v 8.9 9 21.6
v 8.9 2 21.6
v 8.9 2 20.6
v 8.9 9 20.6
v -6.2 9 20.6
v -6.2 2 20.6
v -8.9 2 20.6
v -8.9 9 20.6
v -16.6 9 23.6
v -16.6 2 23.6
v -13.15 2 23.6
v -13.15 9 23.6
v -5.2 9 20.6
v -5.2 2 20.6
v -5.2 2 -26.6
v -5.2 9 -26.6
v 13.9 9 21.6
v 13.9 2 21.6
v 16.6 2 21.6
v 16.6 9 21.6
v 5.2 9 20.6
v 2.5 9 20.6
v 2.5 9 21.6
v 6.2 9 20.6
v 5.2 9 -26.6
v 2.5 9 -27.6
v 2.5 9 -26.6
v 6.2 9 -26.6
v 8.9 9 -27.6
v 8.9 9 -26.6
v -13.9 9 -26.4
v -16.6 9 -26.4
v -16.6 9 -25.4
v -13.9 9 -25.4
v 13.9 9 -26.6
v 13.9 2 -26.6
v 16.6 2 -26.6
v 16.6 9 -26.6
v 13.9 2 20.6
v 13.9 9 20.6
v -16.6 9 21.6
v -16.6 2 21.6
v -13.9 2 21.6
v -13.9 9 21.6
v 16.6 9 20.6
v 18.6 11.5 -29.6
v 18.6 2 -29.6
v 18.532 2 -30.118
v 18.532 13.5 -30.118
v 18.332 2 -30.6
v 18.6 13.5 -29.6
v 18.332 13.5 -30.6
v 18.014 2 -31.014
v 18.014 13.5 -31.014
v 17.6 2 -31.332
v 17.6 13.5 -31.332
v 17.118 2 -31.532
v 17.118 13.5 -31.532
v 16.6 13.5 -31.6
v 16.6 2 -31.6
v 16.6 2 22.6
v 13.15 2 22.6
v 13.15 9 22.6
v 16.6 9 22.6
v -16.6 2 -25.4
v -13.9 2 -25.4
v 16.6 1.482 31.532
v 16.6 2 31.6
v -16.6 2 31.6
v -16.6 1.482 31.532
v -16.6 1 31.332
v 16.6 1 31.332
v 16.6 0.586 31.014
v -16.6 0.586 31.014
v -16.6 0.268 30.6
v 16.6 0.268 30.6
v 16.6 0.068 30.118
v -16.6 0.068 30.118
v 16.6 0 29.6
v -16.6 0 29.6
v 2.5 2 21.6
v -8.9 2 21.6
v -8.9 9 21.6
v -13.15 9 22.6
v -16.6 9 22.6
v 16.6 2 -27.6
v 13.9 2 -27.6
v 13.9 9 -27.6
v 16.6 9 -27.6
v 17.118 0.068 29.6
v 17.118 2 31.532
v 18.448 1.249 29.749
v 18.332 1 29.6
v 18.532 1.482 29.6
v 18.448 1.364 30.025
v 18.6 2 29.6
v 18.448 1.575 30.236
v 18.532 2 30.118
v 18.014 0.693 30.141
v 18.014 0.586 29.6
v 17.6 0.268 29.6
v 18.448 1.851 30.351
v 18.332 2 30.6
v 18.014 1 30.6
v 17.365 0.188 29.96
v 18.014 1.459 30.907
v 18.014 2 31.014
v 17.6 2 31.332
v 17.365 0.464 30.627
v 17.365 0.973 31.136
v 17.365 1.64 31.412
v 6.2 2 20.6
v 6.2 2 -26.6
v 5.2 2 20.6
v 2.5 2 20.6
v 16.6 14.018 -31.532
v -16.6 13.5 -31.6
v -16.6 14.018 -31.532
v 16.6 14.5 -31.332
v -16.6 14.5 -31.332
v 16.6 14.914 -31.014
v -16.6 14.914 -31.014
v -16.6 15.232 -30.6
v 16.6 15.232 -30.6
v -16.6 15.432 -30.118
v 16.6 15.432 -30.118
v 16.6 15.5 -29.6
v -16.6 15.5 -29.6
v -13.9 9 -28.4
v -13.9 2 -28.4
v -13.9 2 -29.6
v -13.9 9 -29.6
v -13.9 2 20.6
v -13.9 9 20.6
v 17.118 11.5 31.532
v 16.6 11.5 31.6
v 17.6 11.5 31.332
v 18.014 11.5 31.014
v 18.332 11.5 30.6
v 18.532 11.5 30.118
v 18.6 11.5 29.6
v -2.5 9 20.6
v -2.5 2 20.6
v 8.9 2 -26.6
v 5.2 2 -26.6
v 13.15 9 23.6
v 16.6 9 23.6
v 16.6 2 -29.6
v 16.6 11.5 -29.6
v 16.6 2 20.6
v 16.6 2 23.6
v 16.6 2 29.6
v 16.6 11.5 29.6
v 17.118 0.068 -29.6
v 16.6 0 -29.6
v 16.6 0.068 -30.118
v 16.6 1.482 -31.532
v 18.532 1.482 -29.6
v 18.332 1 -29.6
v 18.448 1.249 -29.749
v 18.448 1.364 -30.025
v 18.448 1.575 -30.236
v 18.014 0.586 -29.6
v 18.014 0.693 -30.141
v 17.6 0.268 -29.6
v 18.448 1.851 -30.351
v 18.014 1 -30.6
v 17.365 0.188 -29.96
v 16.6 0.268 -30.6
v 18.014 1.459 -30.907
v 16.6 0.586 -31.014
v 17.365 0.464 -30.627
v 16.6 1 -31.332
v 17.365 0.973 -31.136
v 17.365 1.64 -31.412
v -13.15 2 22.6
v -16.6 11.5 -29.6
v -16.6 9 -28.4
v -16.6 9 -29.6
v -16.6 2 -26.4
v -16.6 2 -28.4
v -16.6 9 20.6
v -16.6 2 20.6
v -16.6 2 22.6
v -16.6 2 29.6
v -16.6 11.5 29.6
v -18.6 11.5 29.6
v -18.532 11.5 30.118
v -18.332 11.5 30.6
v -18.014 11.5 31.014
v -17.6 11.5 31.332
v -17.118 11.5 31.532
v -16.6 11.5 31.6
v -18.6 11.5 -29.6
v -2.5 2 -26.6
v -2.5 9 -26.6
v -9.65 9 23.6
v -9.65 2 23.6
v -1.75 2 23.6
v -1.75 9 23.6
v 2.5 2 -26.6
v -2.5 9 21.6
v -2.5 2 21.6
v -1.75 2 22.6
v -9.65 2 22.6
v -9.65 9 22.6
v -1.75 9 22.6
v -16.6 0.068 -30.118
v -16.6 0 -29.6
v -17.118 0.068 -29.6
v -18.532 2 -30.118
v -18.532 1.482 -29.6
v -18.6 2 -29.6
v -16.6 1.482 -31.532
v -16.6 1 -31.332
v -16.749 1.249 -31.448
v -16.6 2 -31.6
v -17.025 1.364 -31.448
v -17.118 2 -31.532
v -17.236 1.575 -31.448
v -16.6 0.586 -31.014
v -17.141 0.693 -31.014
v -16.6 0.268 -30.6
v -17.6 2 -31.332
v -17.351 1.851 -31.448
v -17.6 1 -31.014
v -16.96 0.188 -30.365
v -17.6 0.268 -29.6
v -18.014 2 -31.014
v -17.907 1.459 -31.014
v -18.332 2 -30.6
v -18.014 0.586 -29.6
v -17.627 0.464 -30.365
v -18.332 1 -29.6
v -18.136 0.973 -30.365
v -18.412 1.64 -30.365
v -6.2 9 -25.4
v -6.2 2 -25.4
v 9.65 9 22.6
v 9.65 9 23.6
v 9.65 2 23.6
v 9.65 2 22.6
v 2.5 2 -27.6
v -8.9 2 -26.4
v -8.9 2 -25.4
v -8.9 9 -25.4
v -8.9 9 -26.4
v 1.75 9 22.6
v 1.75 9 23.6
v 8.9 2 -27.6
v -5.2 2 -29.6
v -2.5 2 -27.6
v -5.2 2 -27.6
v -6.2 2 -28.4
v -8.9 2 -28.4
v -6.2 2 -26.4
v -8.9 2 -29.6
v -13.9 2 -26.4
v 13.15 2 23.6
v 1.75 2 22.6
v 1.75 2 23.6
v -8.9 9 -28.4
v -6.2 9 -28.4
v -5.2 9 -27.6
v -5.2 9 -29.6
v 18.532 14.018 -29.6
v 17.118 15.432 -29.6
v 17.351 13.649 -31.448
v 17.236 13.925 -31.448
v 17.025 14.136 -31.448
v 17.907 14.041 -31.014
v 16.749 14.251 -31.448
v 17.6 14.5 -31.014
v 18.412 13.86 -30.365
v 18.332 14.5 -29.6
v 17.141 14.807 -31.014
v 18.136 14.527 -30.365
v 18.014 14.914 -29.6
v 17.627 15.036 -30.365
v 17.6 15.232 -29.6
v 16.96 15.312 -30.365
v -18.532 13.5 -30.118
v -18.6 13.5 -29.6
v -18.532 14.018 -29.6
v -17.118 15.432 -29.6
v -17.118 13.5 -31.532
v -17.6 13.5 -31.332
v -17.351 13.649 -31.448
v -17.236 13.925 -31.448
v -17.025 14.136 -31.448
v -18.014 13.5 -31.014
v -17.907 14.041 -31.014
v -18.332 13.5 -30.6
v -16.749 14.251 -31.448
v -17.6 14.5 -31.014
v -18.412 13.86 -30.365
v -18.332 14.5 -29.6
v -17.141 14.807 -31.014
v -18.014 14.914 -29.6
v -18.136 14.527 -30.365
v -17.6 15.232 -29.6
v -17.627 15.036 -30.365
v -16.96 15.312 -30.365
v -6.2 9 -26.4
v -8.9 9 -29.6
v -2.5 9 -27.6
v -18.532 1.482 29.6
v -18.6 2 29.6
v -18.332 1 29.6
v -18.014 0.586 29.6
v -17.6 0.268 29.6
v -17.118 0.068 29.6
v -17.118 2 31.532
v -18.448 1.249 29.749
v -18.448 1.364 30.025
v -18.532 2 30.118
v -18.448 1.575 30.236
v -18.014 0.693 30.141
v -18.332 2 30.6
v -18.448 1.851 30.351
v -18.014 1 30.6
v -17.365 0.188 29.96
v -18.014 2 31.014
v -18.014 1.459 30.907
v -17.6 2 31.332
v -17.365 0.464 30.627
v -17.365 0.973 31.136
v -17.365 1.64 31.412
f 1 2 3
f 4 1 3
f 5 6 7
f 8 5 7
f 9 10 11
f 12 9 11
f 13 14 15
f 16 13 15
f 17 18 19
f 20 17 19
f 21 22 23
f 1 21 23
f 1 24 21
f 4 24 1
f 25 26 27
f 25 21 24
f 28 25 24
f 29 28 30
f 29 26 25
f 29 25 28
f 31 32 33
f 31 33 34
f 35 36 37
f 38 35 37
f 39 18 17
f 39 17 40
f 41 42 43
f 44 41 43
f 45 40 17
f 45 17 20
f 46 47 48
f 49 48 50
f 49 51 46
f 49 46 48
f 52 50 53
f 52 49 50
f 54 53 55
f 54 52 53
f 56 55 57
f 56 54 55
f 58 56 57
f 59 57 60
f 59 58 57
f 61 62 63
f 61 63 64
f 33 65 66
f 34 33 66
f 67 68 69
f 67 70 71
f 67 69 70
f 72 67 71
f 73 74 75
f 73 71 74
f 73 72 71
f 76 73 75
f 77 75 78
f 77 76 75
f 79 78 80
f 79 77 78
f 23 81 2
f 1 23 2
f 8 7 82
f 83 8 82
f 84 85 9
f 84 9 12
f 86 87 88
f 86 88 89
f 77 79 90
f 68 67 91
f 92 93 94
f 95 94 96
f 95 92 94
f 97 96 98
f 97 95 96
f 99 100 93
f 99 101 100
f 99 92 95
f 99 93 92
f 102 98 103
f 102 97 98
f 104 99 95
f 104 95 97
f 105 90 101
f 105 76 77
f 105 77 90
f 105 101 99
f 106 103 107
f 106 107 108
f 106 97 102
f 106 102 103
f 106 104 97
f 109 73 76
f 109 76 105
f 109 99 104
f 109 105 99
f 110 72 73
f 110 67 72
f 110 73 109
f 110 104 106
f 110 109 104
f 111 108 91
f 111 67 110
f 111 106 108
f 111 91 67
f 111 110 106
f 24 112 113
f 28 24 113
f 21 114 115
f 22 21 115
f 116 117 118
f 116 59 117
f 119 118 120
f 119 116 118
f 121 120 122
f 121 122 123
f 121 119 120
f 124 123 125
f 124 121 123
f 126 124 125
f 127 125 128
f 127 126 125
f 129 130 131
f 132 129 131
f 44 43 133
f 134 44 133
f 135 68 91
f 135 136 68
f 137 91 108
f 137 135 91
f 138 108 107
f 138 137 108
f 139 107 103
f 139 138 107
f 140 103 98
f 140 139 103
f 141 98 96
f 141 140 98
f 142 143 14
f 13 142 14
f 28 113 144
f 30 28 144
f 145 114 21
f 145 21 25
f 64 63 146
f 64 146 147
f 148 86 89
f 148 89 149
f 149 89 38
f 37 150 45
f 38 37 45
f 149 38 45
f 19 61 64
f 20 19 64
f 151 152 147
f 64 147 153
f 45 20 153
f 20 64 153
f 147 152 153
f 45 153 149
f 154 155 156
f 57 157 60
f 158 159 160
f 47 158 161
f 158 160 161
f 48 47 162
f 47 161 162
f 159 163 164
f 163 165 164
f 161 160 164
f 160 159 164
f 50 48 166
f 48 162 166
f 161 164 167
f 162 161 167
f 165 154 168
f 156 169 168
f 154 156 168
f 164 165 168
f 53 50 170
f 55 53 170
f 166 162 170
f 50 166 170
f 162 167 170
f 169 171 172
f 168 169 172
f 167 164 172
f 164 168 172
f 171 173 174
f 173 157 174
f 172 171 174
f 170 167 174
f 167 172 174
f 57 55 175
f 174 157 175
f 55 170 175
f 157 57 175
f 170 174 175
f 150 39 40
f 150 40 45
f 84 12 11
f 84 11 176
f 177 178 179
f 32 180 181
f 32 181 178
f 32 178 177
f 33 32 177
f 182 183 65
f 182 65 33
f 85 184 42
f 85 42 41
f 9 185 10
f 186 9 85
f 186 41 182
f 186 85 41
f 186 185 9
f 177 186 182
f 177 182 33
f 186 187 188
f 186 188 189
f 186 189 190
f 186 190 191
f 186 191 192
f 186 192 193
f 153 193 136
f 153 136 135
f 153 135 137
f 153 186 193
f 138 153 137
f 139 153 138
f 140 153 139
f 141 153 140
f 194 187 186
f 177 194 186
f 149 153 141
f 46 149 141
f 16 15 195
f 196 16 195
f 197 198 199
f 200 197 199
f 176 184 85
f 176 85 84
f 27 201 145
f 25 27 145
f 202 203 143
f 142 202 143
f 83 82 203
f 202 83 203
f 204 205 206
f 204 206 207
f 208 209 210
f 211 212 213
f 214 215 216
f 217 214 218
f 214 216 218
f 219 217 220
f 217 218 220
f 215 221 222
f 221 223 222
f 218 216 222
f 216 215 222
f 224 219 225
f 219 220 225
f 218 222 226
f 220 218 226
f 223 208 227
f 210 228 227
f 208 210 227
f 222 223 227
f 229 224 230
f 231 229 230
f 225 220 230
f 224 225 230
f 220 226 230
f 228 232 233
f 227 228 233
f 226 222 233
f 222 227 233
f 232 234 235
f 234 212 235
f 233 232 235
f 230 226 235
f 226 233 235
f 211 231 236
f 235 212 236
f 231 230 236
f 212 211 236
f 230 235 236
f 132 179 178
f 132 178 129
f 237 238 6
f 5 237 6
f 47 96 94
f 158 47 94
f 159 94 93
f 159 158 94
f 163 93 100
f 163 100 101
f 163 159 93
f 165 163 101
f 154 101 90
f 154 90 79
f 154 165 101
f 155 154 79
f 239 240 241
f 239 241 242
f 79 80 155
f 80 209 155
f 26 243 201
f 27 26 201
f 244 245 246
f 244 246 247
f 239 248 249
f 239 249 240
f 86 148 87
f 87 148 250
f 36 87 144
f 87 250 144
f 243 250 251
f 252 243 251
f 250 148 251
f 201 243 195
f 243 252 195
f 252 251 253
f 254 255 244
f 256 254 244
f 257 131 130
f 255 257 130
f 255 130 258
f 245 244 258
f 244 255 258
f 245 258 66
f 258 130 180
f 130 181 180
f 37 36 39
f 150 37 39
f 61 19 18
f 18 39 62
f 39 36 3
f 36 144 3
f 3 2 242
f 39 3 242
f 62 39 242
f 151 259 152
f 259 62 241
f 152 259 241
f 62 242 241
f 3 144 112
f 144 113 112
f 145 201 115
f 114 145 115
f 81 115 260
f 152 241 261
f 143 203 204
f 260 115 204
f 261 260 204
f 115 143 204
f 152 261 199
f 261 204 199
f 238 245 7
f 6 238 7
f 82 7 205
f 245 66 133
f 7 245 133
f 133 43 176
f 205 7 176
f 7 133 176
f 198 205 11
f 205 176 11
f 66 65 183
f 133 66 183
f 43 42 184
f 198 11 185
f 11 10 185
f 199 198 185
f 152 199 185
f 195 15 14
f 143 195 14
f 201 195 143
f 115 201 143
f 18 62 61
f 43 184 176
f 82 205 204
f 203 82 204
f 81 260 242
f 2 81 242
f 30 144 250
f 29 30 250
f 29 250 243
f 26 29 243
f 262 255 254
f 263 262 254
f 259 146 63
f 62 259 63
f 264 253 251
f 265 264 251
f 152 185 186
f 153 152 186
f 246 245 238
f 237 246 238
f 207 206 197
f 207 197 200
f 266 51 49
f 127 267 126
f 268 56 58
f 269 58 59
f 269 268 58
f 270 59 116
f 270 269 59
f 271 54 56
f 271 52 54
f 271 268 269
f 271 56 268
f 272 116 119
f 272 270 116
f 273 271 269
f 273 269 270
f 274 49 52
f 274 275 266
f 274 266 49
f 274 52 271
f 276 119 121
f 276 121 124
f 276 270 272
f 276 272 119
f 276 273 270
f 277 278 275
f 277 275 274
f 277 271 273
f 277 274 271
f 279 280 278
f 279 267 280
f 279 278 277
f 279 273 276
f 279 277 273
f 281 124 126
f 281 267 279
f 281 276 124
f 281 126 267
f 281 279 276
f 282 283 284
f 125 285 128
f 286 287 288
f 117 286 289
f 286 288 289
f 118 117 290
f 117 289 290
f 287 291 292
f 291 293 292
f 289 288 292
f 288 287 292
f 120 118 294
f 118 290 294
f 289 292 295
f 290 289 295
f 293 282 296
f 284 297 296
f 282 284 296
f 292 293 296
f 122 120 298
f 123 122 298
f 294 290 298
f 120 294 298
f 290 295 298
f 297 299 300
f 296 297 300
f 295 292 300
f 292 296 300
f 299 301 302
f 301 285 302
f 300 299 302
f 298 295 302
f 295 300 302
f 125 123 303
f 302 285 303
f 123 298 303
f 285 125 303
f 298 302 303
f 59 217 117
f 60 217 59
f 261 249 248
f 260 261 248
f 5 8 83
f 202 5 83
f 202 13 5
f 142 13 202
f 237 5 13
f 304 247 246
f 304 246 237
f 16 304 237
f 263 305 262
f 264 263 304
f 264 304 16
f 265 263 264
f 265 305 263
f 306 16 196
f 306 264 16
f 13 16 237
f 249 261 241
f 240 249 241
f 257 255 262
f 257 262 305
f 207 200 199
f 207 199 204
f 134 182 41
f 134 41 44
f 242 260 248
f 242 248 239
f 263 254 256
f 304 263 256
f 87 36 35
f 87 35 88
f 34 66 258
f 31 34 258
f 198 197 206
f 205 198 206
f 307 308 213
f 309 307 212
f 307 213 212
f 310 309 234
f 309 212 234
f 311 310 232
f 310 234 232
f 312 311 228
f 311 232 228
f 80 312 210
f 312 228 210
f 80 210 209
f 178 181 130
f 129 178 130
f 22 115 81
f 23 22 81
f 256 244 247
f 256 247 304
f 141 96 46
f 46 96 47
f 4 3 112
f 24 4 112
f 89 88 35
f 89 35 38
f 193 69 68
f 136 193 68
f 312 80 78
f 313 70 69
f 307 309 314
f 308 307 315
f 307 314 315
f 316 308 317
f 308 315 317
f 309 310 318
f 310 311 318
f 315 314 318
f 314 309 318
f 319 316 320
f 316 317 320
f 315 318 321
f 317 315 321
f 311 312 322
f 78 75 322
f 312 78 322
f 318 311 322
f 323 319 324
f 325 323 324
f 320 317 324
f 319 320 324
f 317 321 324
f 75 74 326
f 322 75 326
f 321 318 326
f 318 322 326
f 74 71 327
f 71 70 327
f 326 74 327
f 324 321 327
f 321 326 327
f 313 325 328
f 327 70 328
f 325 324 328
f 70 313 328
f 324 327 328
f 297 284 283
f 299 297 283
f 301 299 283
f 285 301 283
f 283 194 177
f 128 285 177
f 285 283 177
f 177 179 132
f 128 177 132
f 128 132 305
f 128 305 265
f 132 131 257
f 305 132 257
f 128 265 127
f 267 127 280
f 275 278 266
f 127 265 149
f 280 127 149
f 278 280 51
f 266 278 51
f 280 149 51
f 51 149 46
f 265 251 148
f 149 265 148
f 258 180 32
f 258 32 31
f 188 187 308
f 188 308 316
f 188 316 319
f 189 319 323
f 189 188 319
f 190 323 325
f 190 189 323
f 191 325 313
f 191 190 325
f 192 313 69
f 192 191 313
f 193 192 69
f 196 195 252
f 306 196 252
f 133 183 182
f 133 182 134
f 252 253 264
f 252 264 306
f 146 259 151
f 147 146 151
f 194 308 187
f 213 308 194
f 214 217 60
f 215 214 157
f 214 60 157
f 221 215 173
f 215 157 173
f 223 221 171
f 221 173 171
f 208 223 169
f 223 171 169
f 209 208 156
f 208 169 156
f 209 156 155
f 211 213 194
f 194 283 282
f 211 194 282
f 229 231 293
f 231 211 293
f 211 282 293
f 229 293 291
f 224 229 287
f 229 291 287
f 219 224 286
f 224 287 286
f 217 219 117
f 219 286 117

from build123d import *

# Parameters (mm, degrees)
SKETCH1_W           = 37.2
SKETCH1_H           = 63.2
BOSS_EXTRUDE1_DEPTH = 15.5
FILLET1_R           = 2
SHELL1_START        = -16.6
SHELL1_OUTLINE_W    = 13.5
SHELL1_OUTLINE_H    = 59.2
SHELL1_DEPTH        = 33.2
CUT_EXTRUDE1_START  = 9.5
SKETCH2_W           = 37.2
SKETCH2_H           = 61.2
CUT_EXTRUDE1_DEPTH  = 4
SKETCH3_W           = 2.7
SKETCH3_H           = 1
SKETCH3_W_2         = 1
SKETCH3_H_2         = 47.2
SKETCH3_W_3         = 33.2
SKETCH3_H_3         = 1.2
BOSS_EXTRUDE2_DEPTH = 7
SKETCH4_W           = 3.5
SKETCH4_H           = 1
CUT_EXTRUDE2_DEPTH  = 7


# Read off the part's stored shape, not the designer's step: Shell1
with BuildPart() as part:
    # Sketch1 → Boss-Extrude1 (new body)
    with BuildSketch(Plane(origin=(0, 0, 0), x_dir=(1, 0, 0), z_dir=(0, 1, 0))):
        Rectangle(SKETCH1_W, SKETCH1_H)
    extrude(amount=BOSS_EXTRUDE1_DEPTH)

    # Fillet1
    fillet1_edges = [part.edges().sort_by_distance(p)[0] for p in [
        (-18.6, 15.5, 0),
        (0, 15.5, 31.6),
        (18.6, 15.5, 0),
        (0, 0, 31.6),
        (-18.6, 0, 0),
        (0, 0, -31.6),
        (18.6, 0, 0),
        (18.6, 7.75, 31.6),
        (-18.6, 7.75, 31.6),
        (-18.6, 7.75, -31.6),
        (18.6, 7.75, -31.6),
        (0, 15.5, -31.6),
    ]]
    fillet(fillet1_edges, radius=FILLET1_R)

    # Shell1 outline → Shell1 (cut)
    with BuildSketch(Plane.YZ.offset(SHELL1_START)):
        with Locations((8.75, 0)):
            Rectangle(SHELL1_OUTLINE_W, SHELL1_OUTLINE_H)
    extrude(amount=SHELL1_DEPTH, mode=Mode.SUBTRACT)

    # Sketch2 → Cut-Extrude1 (cut)
    with BuildSketch(Plane(origin=(0, 2, 0), x_dir=(1, 0, 0), z_dir=(0, 1, 0)).offset(CUT_EXTRUDE1_START)):
        with Locations((0, -1)):
            Rectangle(SKETCH2_W, SKETCH2_H)
    extrude(amount=CUT_EXTRUDE1_DEPTH, mode=Mode.SUBTRACT)

    # Sketch3 → Boss-Extrude2 (add)
    with BuildSketch(Plane(origin=(0, 2, 0), x_dir=(1, 0, 0), z_dir=(0, 1, 0))):
        with Locations((-15.25, 25.9)):
            Rectangle(SKETCH3_W, SKETCH3_H)
        with Locations((-7.55, 25.9)):
            Rectangle(SKETCH3_W, SKETCH3_H)
        Polygon((-6.2, 29.6), (-6.2, 28.4), (-6.2, 26.4), (-6.2, 25.4), (-6.2, -20.6), (-5.2, -20.6), (-5.2, 26.6), (-5.2, 27.6), (-5.2, 29.6), align=None)
        with Locations((-3.85, 27.1)):
            Rectangle(SKETCH3_W, SKETCH3_H)
        Polygon((8.9, 27.6), (2.5, 27.6), (2.5, 26.6), (5.2, 26.6), (6.2, 26.6), (8.9, 26.6), align=None)
        with Locations((15.25, 27.1)):
            Rectangle(SKETCH3_W, SKETCH3_H)
        with Locations((5.7, 3)):
            Rectangle(SKETCH3_W_2, SKETCH3_H_2)
        with Locations((-15.25, -21.1)):
            Rectangle(SKETCH3_W, SKETCH3_H)
        Polygon((-5.2, -20.6), (-6.2, -20.6), (-8.9, -20.6), (-8.9, -21.6), (-2.5, -21.6), (-2.5, -20.6), align=None)
        Polygon((5.2, -20.6), (2.5, -20.6), (2.5, -21.6), (8.9, -21.6), (8.9, -20.6), (6.2, -20.6), align=None)
        with Locations((15.25, -21.1)):
            Rectangle(SKETCH3_W, SKETCH3_H)
        with Locations((0, -23.1)):
            Rectangle(SKETCH3_W_3, SKETCH3_H)
        with Locations((-15.25, 29)):
            Rectangle(SKETCH3_W, SKETCH3_H_3)
        with Locations((-7.55, 29)):
            Rectangle(SKETCH3_W, SKETCH3_H_3)
    extrude(amount=BOSS_EXTRUDE2_DEPTH)

    # Sketch4 → Cut-Extrude2 (cut)
    with BuildSketch(Plane(origin=(0, 9, 0), x_dir=(1, 0, 0), z_dir=(0, 1, 0))):
        with Locations((-11.4, -23.1)):
            Rectangle(SKETCH4_W, SKETCH4_H)
        with Locations((0, -23.1)):
            Rectangle(SKETCH4_W, SKETCH4_H)
        with Locations((11.4, -23.1)):
            Rectangle(SKETCH4_W, SKETCH4_H)
    extrude(amount=-CUT_EXTRUDE2_DEPTH, mode=Mode.SUBTRACT)


solid = part.part
